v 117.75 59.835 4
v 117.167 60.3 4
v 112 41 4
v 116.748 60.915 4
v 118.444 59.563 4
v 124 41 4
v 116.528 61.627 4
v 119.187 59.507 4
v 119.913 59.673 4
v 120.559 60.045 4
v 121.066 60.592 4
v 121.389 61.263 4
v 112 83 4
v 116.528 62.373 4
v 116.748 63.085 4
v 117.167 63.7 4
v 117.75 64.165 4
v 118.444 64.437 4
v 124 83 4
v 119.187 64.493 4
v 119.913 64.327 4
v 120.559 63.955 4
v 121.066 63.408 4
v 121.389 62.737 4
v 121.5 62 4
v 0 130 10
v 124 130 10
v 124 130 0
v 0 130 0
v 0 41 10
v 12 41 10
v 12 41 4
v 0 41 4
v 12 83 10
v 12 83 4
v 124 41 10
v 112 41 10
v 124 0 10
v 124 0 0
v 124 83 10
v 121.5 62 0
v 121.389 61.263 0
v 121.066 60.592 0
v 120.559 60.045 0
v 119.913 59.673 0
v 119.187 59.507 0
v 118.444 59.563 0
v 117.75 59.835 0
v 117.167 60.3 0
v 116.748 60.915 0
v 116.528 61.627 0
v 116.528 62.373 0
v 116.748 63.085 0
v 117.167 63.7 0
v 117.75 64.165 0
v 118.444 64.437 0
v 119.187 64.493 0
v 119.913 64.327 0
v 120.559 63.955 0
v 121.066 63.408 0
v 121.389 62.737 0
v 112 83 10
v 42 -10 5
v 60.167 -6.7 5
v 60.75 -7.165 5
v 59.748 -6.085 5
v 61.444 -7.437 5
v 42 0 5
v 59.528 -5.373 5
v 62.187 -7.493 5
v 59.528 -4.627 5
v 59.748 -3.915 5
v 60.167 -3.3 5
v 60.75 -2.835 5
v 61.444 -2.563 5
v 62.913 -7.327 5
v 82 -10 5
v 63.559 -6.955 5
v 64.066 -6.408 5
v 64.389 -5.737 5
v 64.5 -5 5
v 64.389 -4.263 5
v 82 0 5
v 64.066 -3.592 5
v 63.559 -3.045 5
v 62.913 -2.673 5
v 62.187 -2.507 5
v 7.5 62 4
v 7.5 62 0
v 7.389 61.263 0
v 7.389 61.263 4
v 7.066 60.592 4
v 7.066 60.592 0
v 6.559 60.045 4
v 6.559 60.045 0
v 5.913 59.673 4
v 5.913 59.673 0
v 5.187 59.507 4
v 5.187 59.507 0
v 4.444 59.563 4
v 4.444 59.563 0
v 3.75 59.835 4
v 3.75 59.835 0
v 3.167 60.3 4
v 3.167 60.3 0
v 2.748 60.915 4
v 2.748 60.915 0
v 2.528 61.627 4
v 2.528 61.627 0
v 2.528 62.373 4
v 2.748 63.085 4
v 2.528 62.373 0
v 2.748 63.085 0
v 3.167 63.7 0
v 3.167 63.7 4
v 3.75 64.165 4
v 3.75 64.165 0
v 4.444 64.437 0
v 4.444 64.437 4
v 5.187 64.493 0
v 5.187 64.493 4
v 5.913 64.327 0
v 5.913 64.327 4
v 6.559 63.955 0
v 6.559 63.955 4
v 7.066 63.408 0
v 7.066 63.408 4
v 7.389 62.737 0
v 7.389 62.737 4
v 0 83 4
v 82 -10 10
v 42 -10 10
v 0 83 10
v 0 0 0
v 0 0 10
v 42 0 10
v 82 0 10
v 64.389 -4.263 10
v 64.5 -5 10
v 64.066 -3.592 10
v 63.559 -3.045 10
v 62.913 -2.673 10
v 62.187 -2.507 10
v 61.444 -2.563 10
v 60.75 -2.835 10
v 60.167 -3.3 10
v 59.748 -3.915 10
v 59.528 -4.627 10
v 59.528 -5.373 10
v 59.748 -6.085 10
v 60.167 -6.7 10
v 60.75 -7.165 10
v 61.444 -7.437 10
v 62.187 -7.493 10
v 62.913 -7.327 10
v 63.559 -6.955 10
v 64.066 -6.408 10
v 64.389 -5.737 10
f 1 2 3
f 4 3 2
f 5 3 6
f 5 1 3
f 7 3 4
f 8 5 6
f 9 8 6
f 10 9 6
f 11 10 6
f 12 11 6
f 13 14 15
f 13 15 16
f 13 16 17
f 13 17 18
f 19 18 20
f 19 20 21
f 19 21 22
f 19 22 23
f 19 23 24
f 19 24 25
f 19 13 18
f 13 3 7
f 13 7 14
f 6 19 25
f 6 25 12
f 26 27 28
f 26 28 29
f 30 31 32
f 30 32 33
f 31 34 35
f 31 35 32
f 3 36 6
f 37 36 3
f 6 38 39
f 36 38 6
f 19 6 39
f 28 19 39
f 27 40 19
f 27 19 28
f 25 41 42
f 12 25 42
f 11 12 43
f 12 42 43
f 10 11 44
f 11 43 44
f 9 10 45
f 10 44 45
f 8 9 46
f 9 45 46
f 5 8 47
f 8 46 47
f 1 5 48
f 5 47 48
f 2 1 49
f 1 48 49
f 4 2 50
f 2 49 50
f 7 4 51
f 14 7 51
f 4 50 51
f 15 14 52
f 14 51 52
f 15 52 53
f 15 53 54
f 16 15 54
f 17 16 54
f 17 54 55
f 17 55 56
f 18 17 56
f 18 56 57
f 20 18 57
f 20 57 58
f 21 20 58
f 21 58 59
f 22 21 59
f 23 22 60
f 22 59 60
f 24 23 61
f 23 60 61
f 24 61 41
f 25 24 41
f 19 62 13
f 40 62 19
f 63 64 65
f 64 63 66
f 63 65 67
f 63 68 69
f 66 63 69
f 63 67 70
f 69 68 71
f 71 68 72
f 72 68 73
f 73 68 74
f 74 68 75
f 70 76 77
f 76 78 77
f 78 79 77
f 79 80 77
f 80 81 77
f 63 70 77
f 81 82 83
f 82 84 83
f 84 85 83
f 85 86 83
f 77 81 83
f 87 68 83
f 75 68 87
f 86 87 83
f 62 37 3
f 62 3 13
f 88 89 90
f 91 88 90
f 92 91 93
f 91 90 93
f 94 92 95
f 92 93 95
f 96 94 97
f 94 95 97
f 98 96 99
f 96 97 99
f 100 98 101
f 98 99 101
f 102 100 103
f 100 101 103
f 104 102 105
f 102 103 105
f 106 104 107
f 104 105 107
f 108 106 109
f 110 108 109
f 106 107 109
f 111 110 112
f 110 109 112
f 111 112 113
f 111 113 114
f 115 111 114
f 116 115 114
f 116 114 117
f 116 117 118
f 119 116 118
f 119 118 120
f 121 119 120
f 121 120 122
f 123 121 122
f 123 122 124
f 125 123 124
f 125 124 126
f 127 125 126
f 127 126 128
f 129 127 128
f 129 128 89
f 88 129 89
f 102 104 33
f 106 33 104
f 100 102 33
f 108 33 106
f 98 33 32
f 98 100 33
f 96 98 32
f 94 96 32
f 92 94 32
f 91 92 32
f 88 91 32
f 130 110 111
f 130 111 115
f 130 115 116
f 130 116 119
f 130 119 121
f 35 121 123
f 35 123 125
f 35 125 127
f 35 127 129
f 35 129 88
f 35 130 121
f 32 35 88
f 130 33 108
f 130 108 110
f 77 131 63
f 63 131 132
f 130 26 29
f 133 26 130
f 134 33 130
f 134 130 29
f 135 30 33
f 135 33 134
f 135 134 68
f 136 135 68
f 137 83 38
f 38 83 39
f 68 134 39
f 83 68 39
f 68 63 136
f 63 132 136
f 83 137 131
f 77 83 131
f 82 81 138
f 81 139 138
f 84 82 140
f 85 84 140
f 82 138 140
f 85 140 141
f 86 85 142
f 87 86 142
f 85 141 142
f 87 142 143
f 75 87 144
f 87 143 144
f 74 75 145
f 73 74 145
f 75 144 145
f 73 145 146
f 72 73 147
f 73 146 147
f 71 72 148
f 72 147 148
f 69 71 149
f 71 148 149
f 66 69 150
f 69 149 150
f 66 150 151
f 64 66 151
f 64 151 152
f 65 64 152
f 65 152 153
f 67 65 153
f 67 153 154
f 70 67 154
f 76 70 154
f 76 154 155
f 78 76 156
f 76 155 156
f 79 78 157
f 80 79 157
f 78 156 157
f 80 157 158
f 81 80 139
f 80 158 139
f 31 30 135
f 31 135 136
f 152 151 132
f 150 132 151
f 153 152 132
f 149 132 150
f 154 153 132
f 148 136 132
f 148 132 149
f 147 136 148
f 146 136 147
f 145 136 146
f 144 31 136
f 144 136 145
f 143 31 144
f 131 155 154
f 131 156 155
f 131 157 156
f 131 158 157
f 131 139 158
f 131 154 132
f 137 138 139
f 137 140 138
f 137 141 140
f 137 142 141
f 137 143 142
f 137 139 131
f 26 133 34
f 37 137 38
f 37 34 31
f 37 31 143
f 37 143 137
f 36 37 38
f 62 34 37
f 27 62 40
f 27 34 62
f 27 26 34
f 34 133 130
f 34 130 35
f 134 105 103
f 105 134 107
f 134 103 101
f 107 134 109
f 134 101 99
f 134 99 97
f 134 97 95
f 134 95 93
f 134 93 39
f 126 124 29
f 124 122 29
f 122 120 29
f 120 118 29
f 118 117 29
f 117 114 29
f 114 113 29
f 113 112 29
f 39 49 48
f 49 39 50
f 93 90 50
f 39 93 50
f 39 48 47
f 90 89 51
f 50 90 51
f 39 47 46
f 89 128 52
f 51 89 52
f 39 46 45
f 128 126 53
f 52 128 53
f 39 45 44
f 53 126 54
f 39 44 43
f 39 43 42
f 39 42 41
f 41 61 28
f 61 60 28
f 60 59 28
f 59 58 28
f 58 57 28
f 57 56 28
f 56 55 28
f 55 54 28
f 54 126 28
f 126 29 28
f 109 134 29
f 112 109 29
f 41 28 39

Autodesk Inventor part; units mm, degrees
ref_plane "YZ Plane" through (0, 0, 0) normal (1, 0, 0) x (0, 1, 0)
ref_plane "XZ Plane" through (0, 0, 0) normal (0, 1, 0) x (-1, 0, 0)
ref_plane "XY Plane" through (0, 0, 0) normal (0, 0, 1) x (1, 0, 0)
sketch "Sketch1" plane through (0, 0, 0) normal (0, 0, 1) x (1, 0, 0)
  line L0 (0, 0) -> (124, 0)
  line L1 (124, 0) -> (124, 124)
  line L2 (124, 124) -> (0, 124)
  line L3 (0, 124) -> (0, 0)
  circle A0 centre (5, 62) radius 2.5
  circle A1 centre (119, 62) radius 2.5
  point P0 (124, 62)
  point P1 (0, 62)
  dimension "d0" = 124
  dimension "d1" = 124
  dimension "d2" = 5
  dimension "d3" = 5
  dimension "d4" = 5
  dimension "d5" = 5
extrude "Extrusion1" add sketch "Sketch1" along normal blind 10
sketch "Sketch2" plane through (0, 0, 10) normal (0, 0, 1) x (1, 0, 0)
  line L0 (42, 0) -> (82, 0)
  line L1 (82, 0) -> (82, -10)
  line L2 (82, -10) -> (42, -10)
  line L3 (42, -10) -> (42, 0)
  circle A0 centre (62, -5) radius 2.5
  line L4 (0, 0) -> (124, 0) projected
  point P0 (82, -5)
  point P1 (62, -10)
  point P2 (62, 0)
  dimension "d8" = 40
  dimension "d9" = 10
  dimension "d10" = 5
extrude "Extrusion2" add sketch "Sketch2" against normal blind 5
sketch "Sketch3" plane through (0, 0, 10) normal (0, 0, 1) x (1, 0, 0)
  line L0 (0, 124) -> (0, 0) projected
  line L1 (0, 83) -> (12, 83)
  line L2 (12, 83) -> (12, 41)
  line L3 (12, 41) -> (0, 41)
  line L4 (0, 41) -> (0, 83)
  line L5 (124, 0) -> (124, 124) projected
  line L6 (124, 41) -> (112, 41)
  line L7 (112, 41) -> (112, 83)
  line L8 (112, 83) -> (124, 83)
  line L9 (124, 83) -> (124, 41)
  point P0 (124, 62)
  point P1 (124, 62)
  dimension "d13" = 12
  dimension "d14" = 42
  dimension "d15" = 12
  dimension "d16" = 42
extrude "Extrusion3" cut sketch "Sketch3" against normal blind 6
sketch "Sketch4" plane through (0, 0, 10) normal (0, 0, 1) x (1, 0, 0)
  line L0 (0, 124) -> (0, 0) projected
  line L1 (0, 124) -> (124, 124)
  line L2 (124, 124) -> (124, 130)
  line L3 (124, 130) -> (0, 130)
  line L4 (0, 130) -> (0, 124)
  dimension "d19" = 6
extrude "Extrusion4" add sketch "Sketch4" against normal blind 10
properties part number "TC008" material "ABS Plastic"
